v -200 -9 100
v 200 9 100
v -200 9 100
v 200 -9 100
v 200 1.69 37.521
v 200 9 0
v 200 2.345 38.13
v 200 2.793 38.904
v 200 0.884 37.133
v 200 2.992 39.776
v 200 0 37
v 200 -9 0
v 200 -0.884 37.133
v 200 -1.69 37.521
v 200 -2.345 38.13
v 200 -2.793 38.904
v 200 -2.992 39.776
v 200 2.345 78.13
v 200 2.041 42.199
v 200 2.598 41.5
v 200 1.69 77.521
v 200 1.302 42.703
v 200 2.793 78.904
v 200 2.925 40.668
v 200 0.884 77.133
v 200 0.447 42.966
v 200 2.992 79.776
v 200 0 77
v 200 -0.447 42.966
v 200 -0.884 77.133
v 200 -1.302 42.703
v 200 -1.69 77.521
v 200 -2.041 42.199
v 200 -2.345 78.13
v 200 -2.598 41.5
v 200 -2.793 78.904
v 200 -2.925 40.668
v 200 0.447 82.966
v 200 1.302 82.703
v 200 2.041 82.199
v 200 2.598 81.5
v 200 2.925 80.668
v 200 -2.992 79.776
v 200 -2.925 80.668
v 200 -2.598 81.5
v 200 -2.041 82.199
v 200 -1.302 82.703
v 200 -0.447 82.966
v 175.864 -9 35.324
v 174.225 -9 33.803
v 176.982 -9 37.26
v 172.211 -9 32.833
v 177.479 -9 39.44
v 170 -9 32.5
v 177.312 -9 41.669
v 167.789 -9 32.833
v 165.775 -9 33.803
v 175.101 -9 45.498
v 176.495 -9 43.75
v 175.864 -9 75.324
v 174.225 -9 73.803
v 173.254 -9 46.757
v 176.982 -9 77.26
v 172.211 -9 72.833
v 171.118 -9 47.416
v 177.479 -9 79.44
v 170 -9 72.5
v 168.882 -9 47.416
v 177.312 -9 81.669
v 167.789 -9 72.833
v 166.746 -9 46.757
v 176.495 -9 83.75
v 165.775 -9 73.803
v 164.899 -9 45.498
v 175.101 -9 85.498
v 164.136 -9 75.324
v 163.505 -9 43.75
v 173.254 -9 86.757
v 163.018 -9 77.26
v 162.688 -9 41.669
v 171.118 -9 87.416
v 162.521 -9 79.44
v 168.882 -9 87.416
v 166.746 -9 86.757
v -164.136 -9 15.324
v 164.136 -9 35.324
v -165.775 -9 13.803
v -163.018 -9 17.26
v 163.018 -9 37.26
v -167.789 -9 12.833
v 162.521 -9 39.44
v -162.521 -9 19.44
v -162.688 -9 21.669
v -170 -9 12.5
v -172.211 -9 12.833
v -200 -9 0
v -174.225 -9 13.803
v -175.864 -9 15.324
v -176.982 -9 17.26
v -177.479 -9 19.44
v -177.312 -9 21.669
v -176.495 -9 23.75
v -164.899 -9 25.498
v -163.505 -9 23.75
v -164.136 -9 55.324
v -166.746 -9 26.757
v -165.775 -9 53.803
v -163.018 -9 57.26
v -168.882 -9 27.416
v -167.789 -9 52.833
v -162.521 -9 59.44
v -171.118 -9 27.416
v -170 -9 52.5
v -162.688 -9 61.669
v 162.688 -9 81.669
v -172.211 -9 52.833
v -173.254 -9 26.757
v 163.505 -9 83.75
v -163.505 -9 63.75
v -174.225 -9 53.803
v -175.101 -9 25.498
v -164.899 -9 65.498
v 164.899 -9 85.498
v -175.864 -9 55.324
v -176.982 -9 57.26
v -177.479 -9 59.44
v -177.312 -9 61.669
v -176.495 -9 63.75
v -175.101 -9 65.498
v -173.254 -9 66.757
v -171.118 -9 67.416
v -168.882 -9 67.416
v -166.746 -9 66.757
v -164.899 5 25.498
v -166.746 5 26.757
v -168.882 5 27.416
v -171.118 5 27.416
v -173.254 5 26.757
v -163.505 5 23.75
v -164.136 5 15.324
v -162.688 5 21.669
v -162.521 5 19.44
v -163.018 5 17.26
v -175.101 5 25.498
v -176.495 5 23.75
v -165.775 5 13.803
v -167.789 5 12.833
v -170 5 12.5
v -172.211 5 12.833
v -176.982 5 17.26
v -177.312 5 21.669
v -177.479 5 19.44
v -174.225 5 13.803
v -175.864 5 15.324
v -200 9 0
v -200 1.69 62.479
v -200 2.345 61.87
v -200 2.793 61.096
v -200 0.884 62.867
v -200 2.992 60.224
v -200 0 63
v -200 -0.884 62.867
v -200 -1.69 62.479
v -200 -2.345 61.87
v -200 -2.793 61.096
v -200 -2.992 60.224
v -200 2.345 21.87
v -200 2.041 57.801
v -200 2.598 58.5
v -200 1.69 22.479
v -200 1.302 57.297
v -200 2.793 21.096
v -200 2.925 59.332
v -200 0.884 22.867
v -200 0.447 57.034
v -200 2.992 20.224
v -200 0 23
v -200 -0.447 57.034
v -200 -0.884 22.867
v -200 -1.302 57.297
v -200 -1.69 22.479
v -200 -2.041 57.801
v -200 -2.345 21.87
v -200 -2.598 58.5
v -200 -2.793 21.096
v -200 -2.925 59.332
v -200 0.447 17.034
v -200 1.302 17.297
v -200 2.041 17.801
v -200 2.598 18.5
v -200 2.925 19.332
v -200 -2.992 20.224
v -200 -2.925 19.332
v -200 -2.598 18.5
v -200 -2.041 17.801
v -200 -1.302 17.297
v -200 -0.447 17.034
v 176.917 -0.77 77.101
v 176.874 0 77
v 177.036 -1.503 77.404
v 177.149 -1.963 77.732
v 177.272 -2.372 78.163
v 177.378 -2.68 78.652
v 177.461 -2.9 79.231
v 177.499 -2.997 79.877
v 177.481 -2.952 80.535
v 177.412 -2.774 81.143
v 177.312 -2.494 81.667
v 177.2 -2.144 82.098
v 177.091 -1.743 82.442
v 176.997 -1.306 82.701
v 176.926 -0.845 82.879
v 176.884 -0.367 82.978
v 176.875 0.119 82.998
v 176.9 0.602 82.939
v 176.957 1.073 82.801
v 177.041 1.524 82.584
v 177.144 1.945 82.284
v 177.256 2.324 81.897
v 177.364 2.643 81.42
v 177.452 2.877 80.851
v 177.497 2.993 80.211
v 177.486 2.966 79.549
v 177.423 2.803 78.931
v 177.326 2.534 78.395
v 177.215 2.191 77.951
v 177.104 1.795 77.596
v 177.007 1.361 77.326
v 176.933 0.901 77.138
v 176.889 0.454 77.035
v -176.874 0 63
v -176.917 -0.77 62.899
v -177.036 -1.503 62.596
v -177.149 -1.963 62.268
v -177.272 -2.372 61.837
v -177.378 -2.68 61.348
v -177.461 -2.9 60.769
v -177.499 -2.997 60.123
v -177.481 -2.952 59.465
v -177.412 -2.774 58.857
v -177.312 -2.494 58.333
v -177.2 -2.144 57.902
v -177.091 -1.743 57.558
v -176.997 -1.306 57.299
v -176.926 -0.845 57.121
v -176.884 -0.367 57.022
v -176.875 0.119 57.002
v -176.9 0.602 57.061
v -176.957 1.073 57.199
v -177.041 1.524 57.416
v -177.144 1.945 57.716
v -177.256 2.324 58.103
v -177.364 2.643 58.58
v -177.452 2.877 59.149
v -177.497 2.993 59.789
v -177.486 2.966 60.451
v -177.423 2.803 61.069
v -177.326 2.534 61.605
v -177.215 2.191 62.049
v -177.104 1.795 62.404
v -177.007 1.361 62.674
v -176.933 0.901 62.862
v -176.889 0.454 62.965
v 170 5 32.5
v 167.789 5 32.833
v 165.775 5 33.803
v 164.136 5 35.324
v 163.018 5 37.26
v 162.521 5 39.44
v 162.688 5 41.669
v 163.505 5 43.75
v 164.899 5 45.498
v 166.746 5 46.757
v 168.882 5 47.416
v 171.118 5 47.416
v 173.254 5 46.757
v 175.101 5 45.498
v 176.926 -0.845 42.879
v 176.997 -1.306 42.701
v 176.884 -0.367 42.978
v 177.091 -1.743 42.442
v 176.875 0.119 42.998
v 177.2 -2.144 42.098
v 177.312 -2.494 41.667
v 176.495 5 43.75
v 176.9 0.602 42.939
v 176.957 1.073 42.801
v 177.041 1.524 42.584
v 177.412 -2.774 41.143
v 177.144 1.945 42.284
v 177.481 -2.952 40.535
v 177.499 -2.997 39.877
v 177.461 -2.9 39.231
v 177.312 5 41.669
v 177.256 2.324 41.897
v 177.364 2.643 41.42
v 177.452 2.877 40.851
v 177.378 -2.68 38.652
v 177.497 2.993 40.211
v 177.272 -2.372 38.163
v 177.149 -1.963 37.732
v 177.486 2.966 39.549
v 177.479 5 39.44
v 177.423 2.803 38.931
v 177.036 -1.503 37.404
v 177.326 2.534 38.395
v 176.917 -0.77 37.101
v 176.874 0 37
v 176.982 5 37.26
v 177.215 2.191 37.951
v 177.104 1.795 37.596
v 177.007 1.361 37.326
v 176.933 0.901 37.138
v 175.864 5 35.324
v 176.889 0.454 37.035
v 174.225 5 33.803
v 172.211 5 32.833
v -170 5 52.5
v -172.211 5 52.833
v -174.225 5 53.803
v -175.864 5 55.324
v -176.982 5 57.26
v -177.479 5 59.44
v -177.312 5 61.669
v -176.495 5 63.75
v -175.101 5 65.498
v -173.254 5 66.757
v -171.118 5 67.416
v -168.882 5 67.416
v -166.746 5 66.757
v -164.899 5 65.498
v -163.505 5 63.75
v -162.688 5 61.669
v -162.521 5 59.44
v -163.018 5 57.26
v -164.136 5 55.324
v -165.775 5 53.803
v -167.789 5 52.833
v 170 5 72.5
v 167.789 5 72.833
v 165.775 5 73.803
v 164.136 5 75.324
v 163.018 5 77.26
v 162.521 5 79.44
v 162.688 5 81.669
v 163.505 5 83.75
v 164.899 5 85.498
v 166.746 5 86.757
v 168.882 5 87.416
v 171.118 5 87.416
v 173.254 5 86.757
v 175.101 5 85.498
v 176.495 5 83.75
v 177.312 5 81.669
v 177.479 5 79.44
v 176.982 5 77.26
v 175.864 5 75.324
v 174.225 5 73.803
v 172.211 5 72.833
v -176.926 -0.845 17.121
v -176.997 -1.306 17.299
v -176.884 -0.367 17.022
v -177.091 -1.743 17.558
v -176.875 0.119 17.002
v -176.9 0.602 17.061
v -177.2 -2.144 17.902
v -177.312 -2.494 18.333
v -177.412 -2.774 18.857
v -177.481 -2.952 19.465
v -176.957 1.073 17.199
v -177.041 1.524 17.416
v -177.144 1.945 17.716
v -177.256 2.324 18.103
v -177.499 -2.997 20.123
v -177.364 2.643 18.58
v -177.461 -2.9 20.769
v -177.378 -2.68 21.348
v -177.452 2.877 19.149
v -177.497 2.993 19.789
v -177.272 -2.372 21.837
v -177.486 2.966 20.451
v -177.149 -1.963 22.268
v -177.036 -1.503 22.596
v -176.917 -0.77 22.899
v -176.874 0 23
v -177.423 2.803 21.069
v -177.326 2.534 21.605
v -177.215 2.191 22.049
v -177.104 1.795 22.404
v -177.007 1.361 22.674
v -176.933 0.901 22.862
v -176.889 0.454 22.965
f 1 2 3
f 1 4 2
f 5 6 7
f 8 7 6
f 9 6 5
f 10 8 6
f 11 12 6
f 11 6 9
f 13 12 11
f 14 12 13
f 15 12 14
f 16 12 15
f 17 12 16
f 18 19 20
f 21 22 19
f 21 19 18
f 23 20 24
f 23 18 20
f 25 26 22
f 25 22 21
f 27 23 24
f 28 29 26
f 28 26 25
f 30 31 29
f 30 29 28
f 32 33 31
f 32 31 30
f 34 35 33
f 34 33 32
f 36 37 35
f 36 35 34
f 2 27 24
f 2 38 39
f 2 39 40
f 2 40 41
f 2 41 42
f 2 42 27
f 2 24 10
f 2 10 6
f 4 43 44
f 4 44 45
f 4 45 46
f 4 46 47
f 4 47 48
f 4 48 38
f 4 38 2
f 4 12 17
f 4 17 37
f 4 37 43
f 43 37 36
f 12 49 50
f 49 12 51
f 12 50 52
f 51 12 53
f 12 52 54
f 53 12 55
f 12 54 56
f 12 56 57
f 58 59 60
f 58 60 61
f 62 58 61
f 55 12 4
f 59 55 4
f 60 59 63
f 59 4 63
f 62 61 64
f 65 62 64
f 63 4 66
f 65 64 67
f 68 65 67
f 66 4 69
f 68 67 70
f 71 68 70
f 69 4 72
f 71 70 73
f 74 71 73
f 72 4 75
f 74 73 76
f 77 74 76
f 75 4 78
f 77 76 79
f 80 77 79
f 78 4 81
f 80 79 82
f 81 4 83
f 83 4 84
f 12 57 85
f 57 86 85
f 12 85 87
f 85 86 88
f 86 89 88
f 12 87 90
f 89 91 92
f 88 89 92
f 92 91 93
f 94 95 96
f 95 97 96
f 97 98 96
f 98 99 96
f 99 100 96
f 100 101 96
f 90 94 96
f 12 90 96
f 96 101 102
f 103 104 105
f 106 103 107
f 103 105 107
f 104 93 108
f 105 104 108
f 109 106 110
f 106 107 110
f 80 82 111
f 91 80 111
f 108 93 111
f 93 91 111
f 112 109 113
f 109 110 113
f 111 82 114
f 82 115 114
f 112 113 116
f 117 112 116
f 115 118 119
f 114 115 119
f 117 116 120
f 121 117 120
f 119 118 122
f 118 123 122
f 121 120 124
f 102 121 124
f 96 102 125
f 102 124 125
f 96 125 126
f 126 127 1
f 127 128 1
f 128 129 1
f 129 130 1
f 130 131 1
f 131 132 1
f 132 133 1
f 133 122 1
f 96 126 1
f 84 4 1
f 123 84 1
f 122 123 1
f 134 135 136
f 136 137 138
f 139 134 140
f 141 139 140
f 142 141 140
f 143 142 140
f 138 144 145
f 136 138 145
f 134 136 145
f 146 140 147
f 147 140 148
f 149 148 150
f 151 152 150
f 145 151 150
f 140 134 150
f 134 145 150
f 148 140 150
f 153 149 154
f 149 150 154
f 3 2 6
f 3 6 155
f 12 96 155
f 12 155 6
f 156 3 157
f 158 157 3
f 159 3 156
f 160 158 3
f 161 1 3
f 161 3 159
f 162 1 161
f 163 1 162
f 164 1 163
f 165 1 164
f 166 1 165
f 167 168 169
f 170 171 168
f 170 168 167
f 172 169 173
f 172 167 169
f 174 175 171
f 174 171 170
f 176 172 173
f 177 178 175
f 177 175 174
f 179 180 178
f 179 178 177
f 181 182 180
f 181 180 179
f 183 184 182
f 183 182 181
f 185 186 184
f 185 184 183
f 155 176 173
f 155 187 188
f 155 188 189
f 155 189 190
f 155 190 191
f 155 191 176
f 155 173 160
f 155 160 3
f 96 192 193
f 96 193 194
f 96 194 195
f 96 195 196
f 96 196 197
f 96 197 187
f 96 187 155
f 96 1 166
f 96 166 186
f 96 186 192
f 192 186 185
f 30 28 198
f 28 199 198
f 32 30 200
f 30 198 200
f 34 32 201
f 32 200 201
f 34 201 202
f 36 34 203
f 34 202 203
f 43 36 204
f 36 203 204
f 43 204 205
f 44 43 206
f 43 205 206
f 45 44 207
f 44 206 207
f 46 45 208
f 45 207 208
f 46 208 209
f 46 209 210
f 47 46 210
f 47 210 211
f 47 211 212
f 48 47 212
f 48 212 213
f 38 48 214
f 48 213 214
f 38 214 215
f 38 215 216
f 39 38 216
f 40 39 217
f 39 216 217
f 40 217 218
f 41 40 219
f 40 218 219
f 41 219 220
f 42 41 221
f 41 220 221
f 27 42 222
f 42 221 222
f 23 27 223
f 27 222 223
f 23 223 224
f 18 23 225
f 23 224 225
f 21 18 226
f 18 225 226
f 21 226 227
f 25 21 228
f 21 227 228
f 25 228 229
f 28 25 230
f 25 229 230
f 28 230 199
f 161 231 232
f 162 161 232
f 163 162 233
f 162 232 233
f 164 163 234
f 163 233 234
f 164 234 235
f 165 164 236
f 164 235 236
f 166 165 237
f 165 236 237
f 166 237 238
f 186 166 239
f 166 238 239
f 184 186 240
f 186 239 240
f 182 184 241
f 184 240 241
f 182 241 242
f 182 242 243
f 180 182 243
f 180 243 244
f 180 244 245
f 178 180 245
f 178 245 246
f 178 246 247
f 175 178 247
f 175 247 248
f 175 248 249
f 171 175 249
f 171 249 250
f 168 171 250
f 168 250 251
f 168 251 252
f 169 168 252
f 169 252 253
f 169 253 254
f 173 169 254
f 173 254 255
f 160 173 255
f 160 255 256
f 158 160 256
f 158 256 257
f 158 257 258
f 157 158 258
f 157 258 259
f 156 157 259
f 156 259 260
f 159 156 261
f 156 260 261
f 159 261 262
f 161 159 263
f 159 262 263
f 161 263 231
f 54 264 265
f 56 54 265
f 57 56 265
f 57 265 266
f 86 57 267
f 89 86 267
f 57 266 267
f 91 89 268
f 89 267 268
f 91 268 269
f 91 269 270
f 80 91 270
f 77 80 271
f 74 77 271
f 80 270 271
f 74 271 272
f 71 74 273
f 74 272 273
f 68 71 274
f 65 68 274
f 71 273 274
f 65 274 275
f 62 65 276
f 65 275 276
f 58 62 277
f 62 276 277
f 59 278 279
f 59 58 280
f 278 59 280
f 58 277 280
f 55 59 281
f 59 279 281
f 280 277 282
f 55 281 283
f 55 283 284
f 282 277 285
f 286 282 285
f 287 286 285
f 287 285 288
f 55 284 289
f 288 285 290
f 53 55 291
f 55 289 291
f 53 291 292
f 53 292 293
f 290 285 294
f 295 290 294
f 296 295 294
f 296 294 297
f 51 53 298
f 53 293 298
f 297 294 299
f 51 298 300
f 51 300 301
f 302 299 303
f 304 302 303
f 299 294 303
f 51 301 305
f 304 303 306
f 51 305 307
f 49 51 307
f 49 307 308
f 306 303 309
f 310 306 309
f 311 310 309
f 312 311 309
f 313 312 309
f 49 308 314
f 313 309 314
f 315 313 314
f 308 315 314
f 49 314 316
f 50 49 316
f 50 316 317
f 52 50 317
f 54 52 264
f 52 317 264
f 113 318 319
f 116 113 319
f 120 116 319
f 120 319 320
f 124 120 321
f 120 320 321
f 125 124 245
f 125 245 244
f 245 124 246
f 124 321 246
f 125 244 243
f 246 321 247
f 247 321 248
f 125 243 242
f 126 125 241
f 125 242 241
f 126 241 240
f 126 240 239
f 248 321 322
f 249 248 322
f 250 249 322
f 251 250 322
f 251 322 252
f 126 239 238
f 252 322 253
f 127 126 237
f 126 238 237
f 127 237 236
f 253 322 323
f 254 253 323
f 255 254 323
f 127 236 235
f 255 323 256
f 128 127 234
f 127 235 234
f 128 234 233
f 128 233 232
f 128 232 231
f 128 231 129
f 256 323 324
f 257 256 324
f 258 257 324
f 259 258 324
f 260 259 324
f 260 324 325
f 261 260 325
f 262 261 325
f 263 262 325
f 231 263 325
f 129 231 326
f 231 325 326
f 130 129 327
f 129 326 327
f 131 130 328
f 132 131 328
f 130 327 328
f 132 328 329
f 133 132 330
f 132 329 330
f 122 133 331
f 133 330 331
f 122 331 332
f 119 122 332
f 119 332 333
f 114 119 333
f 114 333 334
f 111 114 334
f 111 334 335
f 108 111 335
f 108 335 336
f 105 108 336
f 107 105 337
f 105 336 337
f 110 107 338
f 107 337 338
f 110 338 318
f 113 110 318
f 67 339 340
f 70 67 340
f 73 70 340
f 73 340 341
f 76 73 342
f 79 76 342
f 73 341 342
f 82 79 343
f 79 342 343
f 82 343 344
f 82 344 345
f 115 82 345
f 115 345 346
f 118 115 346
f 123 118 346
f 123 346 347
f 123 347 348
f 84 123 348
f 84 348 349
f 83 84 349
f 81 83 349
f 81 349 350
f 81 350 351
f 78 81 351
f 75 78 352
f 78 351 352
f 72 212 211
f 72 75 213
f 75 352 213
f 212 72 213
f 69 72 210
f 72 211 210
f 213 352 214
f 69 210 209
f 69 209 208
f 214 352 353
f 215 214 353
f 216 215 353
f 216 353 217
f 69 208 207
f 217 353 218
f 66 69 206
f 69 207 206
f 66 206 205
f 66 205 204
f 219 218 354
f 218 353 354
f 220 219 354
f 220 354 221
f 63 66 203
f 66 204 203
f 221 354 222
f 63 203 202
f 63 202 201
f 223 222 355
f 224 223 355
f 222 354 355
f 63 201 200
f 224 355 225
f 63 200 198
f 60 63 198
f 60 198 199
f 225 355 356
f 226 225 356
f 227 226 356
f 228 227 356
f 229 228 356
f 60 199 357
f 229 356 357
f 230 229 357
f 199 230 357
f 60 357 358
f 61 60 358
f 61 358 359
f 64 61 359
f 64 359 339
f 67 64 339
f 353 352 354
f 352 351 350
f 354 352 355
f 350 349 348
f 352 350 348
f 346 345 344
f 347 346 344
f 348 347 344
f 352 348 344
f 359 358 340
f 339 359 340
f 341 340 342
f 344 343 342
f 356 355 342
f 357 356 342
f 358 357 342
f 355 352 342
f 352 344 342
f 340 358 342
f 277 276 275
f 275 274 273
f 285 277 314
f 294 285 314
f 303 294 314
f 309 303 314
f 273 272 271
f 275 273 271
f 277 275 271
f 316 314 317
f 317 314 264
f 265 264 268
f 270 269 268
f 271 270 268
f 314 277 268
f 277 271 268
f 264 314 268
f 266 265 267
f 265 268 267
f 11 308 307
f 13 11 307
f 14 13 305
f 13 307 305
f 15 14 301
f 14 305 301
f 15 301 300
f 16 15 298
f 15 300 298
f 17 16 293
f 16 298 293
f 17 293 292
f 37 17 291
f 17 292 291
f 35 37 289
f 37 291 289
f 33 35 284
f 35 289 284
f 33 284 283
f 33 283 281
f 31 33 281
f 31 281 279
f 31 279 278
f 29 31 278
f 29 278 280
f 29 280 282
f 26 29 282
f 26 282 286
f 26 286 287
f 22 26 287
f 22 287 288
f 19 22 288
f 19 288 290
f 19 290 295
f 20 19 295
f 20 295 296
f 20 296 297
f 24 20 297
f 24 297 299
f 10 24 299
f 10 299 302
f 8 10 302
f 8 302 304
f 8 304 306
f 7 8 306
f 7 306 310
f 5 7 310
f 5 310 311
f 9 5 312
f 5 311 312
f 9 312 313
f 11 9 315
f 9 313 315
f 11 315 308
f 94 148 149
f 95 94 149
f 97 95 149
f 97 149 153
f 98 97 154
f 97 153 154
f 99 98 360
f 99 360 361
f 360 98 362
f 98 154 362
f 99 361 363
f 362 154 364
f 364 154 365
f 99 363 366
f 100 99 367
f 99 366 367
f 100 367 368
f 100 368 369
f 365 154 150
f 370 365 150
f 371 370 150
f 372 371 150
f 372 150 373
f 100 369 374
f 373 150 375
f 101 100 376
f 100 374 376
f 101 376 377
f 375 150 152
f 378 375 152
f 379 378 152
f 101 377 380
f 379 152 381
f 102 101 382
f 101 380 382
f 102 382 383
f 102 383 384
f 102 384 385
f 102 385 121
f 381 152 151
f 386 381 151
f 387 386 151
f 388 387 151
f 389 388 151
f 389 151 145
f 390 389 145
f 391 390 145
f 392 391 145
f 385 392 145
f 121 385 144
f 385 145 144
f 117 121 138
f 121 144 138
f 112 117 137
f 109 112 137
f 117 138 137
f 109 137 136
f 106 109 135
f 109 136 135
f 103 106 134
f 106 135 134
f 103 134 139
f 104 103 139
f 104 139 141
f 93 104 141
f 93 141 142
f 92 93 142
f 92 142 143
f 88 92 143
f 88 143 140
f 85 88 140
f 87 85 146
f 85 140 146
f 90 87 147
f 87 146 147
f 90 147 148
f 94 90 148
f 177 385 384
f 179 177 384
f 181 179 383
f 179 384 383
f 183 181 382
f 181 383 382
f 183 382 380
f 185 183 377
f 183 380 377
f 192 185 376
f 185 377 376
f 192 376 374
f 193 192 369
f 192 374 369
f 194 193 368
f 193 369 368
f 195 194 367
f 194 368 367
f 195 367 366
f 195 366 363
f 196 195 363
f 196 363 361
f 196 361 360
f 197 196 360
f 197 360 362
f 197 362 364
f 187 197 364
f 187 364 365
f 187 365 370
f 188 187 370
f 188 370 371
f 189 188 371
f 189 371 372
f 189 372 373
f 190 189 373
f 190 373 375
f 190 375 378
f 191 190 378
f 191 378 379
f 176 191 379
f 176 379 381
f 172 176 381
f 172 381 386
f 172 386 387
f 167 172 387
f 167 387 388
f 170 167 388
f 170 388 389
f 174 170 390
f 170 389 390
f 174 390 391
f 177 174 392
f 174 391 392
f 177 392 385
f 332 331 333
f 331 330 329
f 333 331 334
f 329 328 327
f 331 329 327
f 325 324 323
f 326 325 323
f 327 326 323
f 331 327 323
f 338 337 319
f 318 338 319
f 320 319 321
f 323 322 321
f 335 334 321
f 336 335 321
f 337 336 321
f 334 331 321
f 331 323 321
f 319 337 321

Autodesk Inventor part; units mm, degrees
ref_plane "YZ Plane" through (0, 0, 0) normal (1, 0, 0) x (0, 1, 0)
ref_plane "XZ Plane" through (0, 0, 0) normal (0, 1, 0) x (-1, 0, 0)
ref_plane "XY Plane" through (0, 0, 0) normal (0, 0, 1) x (1, 0, 0)
sketch "Sketch1" plane through (0, 0, 0) normal (0, 1, 0) x (-1, 0, 0)
  line L0 (200, 0) -> (-200, 0)
  line L1 (-200, 0) -> (-200, 100)
  line L2 (-200, 100) -> (200, 100)
  line L3 (200, 100) -> (200, 0)
  point P0 (0, 0)
  point P1 (0, 0)
  dimension "Length" = 400
  dimension "Depth" = 100
extrude "Extrusion1" add sketch "Sketch1" along normal mid plane 18
sketch "Sketch2" plane through (200, -9, 100) normal (1, 0, 0) x (0, 0, -1)
  line L0 (0, 0) -> (0, 18) projected
  line L1 (100, 9) -> (100, 18) projected
  point P0 (20, 9)
  point P1 (60, 9)
  point P2 (0, 9)
  dimension "d4" = 20
  dimension "d5" = 40
sketch "Sketch3" plane through (0, -9, 0) normal (0, -1, 0) x (1, 0, 0)
  line L0 (200, 0) -> (200, 100) projected
  line L1 (200, 100) -> (-200, 100) projected
  line L2 (0, 0) -> (200, 0) projected
  line L3 (-200, 100) -> (-200, 0) projected
  point P0 (170, 80)
  point P1 (170, 40)
  point P2 (-170, 60)
  point P3 (-170, 20)
  dimension "HoleDepth" = 30
  dimension "d7" = 20
  dimension "d8" = 40
  dimension "d26" = 20
  dimension "d27" = 40
  dimension "d72" = 30
hole "Hole1" at (200, 0, 80) at (200, 0, 40) direction (-1, 0, 0) diameter 6 depth 30
sketch "Sketch4" plane through (-200, -9, 0) normal (-1, 0, 0) x (0, 0, 1)
  line L0 (100, 18) -> (100, 0) projected
  line L1 (0, 0) -> (0, 18) projected
  point P0 (60, 9)
  point P1 (20, 9)
  point P2 (0, 9)
  dimension "d24" = 40
  dimension "d71" = 20
hole "Hole3" at (-200, 0, 60) at (-200, 0, 20) direction (1, 0, 0) diameter 6 depth 30
hole "Hole5" at (170, -9, 80) at (170, -9, 40) direction (0, 1, 0) diameter 15 depth 14
hole "Hole7" at (-170, -9, 60) at (-170, -9, 20) direction (0, 1, 0) diameter 15 depth 14
equation "\"d7\" = d4"
equation "\"d8\" = d5"
equation "\"d26\" = d7"
equation "\"d27\" = d8"
equation "\"d72\" = HoleDepth"
equation "\"d14\" = HoleDepth"
equation "\"d24\" = d5"
equation "\"d71\" = d26"
equation "\"d33\" = HoleDepth"
properties part number "Shelf"
